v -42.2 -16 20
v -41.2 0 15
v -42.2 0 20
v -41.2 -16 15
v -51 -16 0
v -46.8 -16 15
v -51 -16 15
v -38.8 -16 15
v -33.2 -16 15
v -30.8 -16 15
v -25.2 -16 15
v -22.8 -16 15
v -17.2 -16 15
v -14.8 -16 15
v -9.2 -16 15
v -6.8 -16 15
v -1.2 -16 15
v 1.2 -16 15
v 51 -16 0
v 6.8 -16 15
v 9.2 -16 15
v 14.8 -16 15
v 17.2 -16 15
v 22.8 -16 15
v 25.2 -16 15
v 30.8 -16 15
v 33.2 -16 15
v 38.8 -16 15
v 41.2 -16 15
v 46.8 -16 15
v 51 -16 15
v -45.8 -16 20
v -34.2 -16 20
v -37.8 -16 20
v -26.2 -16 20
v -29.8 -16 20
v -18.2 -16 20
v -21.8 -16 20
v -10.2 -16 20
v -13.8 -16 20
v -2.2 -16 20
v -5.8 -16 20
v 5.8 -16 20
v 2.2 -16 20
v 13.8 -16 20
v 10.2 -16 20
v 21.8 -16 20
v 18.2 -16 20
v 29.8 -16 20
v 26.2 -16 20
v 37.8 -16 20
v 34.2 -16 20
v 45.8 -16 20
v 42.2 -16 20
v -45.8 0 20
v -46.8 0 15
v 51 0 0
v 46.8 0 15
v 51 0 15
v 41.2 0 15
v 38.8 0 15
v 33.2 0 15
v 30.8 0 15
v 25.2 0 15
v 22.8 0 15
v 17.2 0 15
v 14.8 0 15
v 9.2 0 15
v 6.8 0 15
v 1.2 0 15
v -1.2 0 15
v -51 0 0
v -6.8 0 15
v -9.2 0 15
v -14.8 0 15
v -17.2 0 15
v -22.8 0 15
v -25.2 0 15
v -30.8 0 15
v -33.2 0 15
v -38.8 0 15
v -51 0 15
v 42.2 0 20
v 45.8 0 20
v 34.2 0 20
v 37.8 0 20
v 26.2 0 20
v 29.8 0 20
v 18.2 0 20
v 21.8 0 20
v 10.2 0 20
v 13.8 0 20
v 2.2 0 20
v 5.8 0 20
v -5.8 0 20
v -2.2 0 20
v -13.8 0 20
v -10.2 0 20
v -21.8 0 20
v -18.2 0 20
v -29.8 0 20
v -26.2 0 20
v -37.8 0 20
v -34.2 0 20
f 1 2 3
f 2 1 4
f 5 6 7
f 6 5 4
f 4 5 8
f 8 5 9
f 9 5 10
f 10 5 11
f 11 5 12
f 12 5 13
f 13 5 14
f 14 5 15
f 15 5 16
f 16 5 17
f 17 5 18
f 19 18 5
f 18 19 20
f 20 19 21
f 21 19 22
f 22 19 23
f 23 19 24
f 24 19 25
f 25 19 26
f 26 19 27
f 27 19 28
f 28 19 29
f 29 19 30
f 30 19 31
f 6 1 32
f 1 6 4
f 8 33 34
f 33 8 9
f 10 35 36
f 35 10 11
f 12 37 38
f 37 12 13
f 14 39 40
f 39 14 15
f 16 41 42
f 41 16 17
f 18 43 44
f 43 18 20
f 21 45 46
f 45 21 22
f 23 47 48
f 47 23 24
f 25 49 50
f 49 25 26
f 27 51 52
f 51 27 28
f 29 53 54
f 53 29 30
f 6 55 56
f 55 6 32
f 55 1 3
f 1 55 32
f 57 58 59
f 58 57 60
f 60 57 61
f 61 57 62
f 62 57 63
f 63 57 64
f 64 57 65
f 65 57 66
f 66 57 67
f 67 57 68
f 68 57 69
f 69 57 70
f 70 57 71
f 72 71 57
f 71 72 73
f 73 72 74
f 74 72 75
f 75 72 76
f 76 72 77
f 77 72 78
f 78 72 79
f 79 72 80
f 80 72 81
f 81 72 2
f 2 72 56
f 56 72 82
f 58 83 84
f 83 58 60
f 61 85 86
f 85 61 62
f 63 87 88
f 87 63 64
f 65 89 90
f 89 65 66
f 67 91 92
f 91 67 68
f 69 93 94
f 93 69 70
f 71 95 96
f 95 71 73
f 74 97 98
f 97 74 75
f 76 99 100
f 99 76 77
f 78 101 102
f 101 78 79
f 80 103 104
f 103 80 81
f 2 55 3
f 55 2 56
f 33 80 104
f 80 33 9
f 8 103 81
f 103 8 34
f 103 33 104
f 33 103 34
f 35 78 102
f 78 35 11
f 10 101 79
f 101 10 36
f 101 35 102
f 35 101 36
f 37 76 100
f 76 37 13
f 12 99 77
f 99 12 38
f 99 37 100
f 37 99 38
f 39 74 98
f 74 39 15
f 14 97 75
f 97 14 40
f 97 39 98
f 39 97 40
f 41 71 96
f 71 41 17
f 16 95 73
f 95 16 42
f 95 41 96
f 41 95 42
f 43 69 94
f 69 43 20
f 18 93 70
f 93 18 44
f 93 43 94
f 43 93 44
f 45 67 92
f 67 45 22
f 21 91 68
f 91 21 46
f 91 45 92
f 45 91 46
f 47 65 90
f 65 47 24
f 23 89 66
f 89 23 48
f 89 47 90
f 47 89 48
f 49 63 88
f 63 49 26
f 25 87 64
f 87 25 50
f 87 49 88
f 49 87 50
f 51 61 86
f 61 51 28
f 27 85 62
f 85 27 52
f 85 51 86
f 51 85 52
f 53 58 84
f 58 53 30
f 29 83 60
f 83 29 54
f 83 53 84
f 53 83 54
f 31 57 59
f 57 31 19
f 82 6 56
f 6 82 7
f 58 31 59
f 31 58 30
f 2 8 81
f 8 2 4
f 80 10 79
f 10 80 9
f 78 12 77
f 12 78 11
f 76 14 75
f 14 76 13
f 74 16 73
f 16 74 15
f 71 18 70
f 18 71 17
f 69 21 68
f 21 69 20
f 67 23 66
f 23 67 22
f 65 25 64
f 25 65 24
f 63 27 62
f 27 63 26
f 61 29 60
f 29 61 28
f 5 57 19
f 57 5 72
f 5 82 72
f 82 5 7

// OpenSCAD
$fn = 32;

// ----------------------------------------------------------------------
// Toothed rack, 12 teeth
// 8 mm pitch, 5 mm teeth
// ----------------------------------------------------------------------

// --- parameters (mm) ---
bar_w = 16;     // bar width (Y)
bar_h = 15;     // bar height (Z)
teeth = 12;     // number of teeth
pitch = 8;      // tooth pitch
tooth_h = 5;    // tooth height above the bar
root_w = 6;     // tooth width at the root
crest_w = 3.6;  // tooth width at the crest

// --- derived feature positions (mm) ---
span = (teeth - 1) * pitch;  // = 88   distance between the outer teeth
bar_l = span + root_w + 8;   // = 102   bar length: teeth plus 4 mm at each end
tooth_x = -span / 2;         // = -44   X of the first tooth
height = bar_h + tooth_h;    // = 20   overall height
feature_centers = [
  [tooth_x + 0 * pitch, -bar_w / 2],
  [tooth_x + 1 * pitch, -bar_w / 2],
  [tooth_x + 2 * pitch, -bar_w / 2],
  [tooth_x + 3 * pitch, -bar_w / 2],
  [tooth_x + 4 * pitch, -bar_w / 2],
  [tooth_x + 5 * pitch, -bar_w / 2],
  [tooth_x + 6 * pitch, -bar_w / 2],
  [tooth_x + 7 * pitch, -bar_w / 2],
  [tooth_x + 8 * pitch, -bar_w / 2],
  [tooth_x + 9 * pitch, -bar_w / 2],
  [tooth_x + 10 * pitch, -bar_w / 2],
  [tooth_x + 11 * pitch, -bar_w / 2]
];   // tooth centre line, drives the tooth loop

// bar with a rack of teeth, one extruded trapezoium per centre
module rack_tooth() {
  linear_extrude(height = bar_w)
    polygon(points = [
      [0, 0],
      [root_w, 0],
      [root_w / 2 + crest_w / 2, tooth_h + 1],
      [root_w / 2 - crest_w / 2, tooth_h + 1]
    ]);
}

union() {
  translate([-bar_l / 2, -bar_w, 0]) cube([bar_l, bar_w, bar_h]);
  for (centre = feature_centers)
    translate([centre[0] - root_w / 2, 0, bar_h - 1]) rotate([90, 0, 0]) rack_tooth();
}
